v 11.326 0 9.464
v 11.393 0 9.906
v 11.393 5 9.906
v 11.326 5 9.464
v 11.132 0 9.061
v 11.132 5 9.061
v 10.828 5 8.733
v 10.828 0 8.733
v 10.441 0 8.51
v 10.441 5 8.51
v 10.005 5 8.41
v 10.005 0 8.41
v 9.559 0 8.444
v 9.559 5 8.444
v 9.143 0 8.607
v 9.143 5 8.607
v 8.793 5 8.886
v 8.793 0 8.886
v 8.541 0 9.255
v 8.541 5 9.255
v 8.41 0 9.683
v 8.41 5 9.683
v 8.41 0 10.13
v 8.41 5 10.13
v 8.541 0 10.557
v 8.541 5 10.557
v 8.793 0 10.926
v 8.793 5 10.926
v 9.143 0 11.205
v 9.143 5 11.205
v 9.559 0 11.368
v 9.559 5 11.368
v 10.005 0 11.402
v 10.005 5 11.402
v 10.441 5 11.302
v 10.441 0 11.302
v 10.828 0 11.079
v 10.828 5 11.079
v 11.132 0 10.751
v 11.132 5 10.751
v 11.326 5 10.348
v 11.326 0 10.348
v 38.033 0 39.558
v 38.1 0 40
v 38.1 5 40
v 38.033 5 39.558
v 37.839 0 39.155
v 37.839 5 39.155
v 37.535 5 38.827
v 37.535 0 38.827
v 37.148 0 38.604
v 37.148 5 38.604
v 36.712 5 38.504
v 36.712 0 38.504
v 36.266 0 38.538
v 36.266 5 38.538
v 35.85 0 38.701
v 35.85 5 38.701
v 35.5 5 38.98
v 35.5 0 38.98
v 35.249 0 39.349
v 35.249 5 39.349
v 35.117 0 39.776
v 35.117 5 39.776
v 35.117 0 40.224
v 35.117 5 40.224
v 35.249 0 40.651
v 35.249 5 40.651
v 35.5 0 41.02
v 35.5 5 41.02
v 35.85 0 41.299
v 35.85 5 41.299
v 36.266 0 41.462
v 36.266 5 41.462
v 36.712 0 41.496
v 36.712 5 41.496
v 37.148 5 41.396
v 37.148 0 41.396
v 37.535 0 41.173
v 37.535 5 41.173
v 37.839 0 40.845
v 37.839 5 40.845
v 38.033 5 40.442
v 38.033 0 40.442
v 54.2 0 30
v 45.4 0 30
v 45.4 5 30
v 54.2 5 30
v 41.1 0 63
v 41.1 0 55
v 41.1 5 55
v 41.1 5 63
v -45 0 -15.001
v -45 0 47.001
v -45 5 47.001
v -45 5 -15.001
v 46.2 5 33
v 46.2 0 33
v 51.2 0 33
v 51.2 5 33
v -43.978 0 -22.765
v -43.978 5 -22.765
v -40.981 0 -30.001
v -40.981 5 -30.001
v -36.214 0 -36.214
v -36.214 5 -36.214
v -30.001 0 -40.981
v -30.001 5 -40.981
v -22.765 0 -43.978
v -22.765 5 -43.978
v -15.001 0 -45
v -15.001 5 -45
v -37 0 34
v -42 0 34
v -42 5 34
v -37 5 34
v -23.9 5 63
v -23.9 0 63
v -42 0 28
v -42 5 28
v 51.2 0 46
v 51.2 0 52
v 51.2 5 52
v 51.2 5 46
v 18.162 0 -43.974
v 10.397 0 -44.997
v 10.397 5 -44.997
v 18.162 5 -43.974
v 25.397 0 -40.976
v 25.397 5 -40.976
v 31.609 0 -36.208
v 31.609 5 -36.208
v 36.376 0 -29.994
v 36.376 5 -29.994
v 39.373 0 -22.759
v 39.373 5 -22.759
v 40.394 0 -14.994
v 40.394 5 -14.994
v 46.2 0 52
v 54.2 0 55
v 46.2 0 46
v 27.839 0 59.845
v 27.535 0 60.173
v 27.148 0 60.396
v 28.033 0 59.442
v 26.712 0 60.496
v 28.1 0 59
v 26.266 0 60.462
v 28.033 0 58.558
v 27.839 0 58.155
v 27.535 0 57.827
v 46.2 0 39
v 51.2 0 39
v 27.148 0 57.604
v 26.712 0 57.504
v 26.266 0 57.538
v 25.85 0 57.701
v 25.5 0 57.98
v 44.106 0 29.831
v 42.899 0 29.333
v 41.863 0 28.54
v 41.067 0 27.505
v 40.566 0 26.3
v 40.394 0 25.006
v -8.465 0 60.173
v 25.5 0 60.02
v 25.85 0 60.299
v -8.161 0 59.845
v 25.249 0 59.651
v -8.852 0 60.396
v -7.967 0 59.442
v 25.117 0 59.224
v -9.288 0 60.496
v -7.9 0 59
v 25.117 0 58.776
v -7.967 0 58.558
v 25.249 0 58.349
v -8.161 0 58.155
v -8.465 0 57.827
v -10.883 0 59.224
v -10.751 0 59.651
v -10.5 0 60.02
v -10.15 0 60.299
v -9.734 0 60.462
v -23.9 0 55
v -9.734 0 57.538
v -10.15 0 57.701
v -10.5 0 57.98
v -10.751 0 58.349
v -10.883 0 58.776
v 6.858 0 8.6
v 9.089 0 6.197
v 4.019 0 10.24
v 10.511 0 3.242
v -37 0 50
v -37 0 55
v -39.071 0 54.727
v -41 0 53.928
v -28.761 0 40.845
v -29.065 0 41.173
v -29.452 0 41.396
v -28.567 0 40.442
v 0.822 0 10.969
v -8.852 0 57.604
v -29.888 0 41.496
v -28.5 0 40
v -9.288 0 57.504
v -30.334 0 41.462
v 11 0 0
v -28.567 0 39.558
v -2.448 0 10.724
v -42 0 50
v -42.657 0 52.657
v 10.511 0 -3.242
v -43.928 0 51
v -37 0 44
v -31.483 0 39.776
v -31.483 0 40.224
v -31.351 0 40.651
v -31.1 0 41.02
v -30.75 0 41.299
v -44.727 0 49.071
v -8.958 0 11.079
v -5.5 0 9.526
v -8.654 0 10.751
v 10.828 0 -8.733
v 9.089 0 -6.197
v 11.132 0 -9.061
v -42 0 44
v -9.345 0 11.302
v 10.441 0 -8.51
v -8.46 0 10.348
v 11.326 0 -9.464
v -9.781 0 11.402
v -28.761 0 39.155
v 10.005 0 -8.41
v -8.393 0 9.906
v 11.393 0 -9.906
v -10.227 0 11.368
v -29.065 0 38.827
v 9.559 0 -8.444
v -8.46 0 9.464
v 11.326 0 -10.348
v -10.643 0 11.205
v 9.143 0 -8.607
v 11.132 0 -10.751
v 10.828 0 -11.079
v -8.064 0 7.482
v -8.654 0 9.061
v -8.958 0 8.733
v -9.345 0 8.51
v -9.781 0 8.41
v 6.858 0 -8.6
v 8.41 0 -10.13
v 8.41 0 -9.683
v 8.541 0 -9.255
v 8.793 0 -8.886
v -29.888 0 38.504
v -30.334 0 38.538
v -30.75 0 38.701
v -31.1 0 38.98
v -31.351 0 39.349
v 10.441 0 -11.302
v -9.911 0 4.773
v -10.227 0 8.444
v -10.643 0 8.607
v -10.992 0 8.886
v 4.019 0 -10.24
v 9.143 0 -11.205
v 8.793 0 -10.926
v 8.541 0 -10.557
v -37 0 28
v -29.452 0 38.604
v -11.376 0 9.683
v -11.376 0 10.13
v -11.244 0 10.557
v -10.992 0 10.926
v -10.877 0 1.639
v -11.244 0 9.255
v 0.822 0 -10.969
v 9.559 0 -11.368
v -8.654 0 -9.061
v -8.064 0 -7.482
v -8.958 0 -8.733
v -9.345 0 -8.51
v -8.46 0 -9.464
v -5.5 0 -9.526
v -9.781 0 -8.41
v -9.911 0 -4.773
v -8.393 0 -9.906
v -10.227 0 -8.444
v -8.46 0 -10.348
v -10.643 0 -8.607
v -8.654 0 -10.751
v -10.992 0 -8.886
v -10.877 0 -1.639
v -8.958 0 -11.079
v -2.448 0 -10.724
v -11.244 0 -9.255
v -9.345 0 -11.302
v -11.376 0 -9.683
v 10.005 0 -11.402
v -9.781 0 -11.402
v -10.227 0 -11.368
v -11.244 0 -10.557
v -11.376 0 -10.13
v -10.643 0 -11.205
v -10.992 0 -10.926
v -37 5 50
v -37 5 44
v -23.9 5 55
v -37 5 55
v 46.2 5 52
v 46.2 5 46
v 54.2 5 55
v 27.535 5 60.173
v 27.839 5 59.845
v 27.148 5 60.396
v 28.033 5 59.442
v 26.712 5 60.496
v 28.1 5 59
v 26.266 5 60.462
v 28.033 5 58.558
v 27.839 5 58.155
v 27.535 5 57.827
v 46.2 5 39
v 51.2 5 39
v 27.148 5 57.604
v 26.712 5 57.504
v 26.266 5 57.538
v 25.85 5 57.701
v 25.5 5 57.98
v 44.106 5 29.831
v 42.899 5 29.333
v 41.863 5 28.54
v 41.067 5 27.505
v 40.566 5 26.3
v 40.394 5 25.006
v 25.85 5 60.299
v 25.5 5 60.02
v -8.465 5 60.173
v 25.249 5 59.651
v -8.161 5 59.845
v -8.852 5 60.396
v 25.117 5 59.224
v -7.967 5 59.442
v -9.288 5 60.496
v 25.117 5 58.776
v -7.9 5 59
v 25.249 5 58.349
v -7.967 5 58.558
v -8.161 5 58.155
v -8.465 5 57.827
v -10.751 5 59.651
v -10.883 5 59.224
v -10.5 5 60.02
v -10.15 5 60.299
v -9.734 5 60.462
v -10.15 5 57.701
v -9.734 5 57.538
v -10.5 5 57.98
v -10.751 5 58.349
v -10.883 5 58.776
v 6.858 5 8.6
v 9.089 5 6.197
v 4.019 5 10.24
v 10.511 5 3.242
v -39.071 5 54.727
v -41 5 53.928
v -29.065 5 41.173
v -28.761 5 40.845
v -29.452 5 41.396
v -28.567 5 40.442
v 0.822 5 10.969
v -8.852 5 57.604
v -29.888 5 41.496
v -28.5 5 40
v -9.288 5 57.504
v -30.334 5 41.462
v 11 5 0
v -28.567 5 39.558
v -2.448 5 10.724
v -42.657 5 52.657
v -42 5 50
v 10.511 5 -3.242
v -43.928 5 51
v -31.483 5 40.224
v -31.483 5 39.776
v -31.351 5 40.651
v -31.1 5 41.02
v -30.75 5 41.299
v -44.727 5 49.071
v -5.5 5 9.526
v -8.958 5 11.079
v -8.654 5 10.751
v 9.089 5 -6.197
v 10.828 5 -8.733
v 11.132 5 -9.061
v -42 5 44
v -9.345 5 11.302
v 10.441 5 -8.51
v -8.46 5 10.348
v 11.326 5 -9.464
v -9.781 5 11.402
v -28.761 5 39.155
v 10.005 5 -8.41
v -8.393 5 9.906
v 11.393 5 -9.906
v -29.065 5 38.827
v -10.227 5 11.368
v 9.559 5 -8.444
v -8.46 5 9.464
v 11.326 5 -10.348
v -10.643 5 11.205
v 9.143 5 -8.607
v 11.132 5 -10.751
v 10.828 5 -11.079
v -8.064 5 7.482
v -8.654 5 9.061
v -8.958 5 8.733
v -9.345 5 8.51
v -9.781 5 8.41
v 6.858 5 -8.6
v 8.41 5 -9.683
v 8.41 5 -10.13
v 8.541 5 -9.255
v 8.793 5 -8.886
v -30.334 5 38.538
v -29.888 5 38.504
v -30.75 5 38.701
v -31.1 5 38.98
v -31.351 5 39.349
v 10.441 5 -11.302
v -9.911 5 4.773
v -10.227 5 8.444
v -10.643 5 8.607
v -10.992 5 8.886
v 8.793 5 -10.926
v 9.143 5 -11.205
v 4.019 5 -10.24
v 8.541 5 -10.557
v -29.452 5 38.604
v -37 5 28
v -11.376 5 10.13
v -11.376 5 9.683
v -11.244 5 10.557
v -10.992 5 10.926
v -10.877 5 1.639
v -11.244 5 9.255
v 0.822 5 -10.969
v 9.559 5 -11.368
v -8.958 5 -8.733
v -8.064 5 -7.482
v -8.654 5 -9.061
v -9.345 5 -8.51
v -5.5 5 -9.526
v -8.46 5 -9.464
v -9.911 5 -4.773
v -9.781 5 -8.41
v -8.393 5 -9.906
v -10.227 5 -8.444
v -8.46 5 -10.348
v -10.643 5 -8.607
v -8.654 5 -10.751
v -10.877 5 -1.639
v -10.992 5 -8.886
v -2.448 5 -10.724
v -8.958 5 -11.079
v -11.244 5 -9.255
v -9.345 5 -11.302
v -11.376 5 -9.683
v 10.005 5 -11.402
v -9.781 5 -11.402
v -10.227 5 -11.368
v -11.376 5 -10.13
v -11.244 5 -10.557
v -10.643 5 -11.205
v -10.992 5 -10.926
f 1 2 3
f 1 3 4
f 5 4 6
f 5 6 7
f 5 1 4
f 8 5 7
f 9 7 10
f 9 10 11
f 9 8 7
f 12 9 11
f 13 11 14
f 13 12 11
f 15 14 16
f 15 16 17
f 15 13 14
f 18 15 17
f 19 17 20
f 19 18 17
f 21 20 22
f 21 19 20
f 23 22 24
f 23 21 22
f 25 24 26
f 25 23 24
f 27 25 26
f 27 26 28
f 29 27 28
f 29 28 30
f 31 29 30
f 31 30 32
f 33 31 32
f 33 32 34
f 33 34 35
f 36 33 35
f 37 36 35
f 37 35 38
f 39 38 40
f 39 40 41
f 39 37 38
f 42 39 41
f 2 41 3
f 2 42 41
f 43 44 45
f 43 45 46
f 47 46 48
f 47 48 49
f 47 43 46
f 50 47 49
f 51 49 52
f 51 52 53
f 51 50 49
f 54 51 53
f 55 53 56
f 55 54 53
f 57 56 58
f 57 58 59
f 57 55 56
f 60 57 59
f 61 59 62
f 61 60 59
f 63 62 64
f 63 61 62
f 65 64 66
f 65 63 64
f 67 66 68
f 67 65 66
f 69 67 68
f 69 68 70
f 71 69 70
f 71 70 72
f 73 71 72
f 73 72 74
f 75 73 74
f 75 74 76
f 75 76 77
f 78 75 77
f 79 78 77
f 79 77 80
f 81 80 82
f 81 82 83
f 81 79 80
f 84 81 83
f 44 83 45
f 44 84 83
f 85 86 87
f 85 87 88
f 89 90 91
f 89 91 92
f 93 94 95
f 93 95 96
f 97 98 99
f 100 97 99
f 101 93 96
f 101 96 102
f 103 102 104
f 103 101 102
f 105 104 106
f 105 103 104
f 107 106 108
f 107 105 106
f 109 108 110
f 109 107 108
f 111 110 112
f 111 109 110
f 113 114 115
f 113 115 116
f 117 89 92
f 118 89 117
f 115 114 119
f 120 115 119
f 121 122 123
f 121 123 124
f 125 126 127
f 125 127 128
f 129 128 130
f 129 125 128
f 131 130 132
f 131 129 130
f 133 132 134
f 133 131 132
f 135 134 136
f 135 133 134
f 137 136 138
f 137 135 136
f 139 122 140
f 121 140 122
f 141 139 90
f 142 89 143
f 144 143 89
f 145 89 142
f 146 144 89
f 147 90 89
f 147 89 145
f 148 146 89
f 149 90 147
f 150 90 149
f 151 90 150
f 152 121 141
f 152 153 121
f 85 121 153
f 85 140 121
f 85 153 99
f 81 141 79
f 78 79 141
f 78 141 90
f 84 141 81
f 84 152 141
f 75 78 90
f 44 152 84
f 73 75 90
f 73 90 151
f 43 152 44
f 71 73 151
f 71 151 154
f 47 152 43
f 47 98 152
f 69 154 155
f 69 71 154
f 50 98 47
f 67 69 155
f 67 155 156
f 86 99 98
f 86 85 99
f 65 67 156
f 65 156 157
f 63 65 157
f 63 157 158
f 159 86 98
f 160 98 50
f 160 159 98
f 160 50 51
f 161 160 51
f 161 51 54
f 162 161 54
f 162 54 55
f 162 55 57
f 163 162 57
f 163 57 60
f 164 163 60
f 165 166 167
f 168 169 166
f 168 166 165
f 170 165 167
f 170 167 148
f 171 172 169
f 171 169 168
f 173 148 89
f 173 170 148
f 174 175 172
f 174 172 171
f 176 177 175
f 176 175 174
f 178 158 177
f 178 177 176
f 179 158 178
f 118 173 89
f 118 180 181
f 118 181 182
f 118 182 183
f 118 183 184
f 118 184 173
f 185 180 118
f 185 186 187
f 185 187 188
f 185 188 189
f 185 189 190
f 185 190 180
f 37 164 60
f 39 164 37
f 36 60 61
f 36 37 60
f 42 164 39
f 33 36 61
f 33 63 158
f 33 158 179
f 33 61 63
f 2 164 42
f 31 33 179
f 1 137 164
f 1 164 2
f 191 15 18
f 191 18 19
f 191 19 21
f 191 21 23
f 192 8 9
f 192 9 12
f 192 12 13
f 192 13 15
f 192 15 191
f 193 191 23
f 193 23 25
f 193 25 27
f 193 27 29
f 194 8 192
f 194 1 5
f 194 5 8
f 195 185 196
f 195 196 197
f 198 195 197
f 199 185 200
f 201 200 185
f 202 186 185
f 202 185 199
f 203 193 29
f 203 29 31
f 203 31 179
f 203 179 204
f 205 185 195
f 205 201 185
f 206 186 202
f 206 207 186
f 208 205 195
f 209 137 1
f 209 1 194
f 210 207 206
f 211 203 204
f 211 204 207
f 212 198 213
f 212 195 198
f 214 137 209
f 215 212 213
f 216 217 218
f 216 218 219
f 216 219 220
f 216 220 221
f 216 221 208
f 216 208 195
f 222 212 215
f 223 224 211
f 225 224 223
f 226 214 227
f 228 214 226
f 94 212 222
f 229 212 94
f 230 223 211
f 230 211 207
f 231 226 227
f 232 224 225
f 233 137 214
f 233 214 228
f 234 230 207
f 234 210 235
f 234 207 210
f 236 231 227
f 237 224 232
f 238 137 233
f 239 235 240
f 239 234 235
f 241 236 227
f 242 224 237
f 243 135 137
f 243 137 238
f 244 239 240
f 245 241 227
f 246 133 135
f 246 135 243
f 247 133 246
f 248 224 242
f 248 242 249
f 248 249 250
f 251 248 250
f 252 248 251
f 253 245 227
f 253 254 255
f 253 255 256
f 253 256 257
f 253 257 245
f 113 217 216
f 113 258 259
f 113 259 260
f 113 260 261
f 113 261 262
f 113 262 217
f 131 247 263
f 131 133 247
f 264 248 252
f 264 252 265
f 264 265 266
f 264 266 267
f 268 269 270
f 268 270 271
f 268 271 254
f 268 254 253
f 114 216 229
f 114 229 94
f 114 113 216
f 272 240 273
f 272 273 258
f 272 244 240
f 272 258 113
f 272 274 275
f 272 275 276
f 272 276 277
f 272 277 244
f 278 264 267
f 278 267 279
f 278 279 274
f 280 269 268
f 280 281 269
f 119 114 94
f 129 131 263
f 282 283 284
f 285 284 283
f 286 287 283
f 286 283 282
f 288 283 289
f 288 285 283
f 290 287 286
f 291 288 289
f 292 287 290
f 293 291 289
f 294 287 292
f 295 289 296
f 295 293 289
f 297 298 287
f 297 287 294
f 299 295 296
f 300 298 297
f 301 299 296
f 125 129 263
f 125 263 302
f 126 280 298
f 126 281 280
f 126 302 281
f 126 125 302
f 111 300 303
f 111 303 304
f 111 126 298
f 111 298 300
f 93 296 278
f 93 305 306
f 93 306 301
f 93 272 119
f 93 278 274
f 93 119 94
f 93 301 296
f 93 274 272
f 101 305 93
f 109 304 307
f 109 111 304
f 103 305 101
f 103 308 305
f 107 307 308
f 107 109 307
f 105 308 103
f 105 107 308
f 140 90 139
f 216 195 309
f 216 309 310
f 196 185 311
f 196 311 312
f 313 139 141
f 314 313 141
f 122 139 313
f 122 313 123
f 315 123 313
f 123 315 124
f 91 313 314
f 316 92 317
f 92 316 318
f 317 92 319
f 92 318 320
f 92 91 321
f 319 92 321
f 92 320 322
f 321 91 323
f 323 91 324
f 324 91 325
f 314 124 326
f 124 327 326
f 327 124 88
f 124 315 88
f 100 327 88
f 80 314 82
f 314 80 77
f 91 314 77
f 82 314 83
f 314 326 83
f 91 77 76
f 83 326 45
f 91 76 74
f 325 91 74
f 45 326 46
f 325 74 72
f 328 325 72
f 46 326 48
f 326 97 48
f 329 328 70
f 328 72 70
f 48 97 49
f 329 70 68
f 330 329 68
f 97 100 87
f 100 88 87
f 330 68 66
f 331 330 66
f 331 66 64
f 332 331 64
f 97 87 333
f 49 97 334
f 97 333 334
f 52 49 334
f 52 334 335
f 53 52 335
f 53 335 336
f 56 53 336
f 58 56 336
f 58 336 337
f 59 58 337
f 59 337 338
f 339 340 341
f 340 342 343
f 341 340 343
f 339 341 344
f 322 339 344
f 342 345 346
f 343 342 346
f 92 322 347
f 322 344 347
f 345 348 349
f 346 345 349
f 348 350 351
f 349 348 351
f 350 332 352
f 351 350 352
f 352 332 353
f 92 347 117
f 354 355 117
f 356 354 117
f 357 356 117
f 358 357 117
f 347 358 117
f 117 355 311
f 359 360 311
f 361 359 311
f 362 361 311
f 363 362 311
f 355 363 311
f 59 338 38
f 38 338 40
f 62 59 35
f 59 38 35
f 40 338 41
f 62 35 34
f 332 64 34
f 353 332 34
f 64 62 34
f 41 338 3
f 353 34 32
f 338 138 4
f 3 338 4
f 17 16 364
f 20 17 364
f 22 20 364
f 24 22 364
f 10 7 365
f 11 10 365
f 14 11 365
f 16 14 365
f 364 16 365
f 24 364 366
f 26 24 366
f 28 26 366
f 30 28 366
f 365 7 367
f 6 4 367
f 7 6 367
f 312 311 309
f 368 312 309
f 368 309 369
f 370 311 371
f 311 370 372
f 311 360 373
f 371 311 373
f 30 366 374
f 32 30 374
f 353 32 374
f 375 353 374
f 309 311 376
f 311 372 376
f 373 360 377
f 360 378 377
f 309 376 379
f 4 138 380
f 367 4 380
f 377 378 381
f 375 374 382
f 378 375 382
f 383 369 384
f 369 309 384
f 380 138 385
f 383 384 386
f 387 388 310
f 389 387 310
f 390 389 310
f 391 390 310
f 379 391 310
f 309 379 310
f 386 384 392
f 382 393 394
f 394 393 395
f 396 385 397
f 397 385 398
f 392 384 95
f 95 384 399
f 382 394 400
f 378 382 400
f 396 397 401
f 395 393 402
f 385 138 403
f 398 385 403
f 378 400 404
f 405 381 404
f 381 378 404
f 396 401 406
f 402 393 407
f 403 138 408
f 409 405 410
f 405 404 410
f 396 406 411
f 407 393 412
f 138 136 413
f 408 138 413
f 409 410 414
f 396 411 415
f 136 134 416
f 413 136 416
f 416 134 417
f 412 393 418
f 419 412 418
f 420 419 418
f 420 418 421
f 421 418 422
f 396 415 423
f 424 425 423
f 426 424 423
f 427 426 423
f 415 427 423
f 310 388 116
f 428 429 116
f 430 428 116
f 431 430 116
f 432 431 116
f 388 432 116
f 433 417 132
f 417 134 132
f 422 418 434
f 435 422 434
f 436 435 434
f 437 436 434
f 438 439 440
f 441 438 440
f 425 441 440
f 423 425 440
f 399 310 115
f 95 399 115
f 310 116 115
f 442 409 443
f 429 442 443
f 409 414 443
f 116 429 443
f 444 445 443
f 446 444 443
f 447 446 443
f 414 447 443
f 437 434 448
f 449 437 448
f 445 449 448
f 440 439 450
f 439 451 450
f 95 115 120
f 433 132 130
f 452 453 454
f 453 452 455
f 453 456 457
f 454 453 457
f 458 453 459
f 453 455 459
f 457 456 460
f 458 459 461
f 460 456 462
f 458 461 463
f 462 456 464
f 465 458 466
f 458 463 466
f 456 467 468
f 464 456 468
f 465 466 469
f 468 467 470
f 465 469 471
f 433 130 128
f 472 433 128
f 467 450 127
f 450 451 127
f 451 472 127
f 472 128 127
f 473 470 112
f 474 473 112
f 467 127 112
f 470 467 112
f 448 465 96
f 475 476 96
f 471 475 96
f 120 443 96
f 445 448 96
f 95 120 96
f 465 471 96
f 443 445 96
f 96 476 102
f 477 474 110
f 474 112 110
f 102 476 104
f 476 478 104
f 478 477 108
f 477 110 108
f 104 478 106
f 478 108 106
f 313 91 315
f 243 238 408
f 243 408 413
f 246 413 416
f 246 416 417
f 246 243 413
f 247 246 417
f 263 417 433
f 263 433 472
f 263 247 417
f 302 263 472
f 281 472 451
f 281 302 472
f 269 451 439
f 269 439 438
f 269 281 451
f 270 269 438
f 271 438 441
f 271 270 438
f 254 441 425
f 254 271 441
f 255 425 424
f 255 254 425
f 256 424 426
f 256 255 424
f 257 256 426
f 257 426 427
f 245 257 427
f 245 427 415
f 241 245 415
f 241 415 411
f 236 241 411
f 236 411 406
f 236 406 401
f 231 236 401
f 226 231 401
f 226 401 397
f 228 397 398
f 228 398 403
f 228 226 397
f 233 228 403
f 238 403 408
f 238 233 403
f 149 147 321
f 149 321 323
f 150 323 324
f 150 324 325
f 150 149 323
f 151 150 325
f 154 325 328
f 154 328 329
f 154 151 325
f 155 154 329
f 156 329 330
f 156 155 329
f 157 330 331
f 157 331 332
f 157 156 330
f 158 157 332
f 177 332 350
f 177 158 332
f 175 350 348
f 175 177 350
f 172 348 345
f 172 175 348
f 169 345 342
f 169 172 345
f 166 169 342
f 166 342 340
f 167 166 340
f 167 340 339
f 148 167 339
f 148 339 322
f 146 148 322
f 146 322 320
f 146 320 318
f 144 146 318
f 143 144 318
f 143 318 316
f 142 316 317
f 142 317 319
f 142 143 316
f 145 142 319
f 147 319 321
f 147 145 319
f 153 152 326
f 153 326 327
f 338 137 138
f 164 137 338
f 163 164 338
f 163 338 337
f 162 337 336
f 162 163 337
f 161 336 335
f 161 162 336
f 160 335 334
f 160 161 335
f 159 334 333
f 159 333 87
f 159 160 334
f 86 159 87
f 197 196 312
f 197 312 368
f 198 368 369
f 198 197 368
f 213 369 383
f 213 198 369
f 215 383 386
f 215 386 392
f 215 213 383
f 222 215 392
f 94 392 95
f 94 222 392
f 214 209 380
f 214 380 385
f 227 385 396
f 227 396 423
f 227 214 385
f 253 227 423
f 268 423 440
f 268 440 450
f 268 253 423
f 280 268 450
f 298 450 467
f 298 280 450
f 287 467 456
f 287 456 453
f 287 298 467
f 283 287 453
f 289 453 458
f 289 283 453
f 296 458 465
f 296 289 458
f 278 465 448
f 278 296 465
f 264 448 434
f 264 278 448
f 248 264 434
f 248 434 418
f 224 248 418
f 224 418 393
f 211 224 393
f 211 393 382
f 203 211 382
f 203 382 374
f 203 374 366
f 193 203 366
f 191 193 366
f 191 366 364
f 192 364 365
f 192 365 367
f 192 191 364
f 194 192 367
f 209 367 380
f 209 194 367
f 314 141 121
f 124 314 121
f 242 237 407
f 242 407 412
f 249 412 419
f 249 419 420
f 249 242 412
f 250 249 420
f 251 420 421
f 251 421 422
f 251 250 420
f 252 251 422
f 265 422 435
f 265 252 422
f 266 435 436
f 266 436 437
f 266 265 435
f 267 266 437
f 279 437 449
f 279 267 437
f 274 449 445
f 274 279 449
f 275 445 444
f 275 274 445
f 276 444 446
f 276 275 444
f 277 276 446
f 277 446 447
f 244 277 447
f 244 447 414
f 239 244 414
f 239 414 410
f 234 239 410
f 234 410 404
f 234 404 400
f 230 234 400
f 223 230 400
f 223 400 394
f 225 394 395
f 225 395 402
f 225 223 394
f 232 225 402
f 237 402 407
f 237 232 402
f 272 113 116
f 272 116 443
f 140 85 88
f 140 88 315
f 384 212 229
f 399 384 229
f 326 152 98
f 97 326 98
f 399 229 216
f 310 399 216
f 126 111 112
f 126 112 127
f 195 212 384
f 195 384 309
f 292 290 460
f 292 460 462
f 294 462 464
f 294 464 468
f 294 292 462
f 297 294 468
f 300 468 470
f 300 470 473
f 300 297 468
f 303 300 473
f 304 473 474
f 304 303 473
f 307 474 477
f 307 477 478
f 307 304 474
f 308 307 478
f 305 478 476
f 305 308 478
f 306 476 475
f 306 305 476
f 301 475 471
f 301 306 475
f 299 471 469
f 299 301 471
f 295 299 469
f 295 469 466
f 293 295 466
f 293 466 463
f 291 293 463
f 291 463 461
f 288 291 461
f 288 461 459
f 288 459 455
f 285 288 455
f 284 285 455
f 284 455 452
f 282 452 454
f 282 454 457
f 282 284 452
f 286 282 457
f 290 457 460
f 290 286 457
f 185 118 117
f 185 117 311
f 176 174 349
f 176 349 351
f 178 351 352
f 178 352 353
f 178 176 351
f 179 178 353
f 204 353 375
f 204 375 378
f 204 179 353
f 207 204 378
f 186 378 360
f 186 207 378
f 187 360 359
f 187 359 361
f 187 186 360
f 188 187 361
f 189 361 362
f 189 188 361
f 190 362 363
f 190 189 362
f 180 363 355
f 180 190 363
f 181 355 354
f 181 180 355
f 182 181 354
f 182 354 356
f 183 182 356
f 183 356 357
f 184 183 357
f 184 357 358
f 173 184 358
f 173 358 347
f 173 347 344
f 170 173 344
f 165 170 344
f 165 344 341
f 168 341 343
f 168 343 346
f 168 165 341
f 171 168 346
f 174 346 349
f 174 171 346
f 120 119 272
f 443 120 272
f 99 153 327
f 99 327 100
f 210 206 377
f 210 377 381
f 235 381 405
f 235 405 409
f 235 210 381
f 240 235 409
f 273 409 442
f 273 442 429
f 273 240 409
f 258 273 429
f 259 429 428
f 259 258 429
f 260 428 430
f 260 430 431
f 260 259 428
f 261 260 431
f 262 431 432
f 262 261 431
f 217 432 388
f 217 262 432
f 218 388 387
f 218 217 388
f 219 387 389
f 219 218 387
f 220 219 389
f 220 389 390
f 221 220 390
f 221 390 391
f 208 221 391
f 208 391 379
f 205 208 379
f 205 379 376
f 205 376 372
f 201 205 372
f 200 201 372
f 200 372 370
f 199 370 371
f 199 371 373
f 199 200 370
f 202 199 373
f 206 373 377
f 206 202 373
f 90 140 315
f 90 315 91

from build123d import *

# Parameters (mm, degrees)
SKETCH1_R           = 11
SKETCH1_R_2         = 1.5
SKETCH1_W           = 5
SKETCH1_H           = 6
BOSS_EXTRUDE1_DEPTH = 5


with BuildPart() as part:
    # Sketch1 → Boss-Extrude1 (new body)
    with BuildSketch(Plane(origin=(0, 0, 0), x_dir=(1, 0, 0), z_dir=(0, 1, 0))):
        with BuildLine():
            Line((40.393958783, 14.993950885), (40.393958783, -25.006049115))
            ThreePointArc((40.393958783, -25.006049115), (41.862698298, -28.539809641), (45.4, -30))
            Line((45.4, -30), (54.2, -30))
            Line((54.2, -30), (54.2, -55))
            Line((54.2, -55), (41.099999997, -55))
            Line((41.099999997, -55), (41.099999997, -63))
            Line((41.099999997, -63), (-23.900000003, -63))
            Line((-23.900000003, -63), (-23.900000003, -55))
            Line((-23.900000003, -55), (-37.00036842, -55))
            ThreePointArc((-37.00036842, -55), (-42.656802211, -52.657122122), (-45.000000024, -47.000820858))
            Line((-45.000000024, -47.000820858), (-45.000000024, 15.001139744))
            ThreePointArc((-45.000000024, 15.001139744), (-36.213537283, 36.213537259), (-15.001139768, 45))
            Line((-15.001139768, 45), (10.397234849, 44.997226593))
            ThreePointArc((10.397234849, 44.997226593), (31.609478673, 36.208113679), (40.393958783, 14.993950885))
        make_face()
        Circle(SKETCH1_R, mode=Mode.SUBTRACT)
        with Locations((9.89288341, 9.906102051)):
            Circle(SKETCH1_R_2, mode=Mode.SUBTRACT)
        with Locations((9.89288341, -9.906102051)):
            Circle(SKETCH1_R_2, mode=Mode.SUBTRACT)
        with Locations((-9.89288341, -9.906102051)):
            Circle(SKETCH1_R_2, mode=Mode.SUBTRACT)
        with Locations((-9.89288341, 9.906102051)):
            Circle(SKETCH1_R_2, mode=Mode.SUBTRACT)
        with Locations((-9.400000003, -59)):
            Circle(SKETCH1_R_2, mode=Mode.SUBTRACT)
        with Locations((26.599999997, -59)):
            Circle(SKETCH1_R_2, mode=Mode.SUBTRACT)
        with Locations((-30.000000024, -40)):
            Circle(SKETCH1_R_2, mode=Mode.SUBTRACT)
        with Locations((36.599999976, -40)):
            Circle(SKETCH1_R_2, mode=Mode.SUBTRACT)
        with Locations((-39.500000024, -31)):
            Rectangle(SKETCH1_W, SKETCH1_H, mode=Mode.SUBTRACT)
        with Locations((-39.500000024, -47)):
            Rectangle(SKETCH1_W, SKETCH1_H, mode=Mode.SUBTRACT)
        with Locations((48.7, -36)):
            Rectangle(SKETCH1_W, SKETCH1_H, mode=Mode.SUBTRACT)
        with Locations((48.7, -49)):
            Rectangle(SKETCH1_W, SKETCH1_H, mode=Mode.SUBTRACT)
    extrude(amount=BOSS_EXTRUDE1_DEPTH)


solid = part.part
